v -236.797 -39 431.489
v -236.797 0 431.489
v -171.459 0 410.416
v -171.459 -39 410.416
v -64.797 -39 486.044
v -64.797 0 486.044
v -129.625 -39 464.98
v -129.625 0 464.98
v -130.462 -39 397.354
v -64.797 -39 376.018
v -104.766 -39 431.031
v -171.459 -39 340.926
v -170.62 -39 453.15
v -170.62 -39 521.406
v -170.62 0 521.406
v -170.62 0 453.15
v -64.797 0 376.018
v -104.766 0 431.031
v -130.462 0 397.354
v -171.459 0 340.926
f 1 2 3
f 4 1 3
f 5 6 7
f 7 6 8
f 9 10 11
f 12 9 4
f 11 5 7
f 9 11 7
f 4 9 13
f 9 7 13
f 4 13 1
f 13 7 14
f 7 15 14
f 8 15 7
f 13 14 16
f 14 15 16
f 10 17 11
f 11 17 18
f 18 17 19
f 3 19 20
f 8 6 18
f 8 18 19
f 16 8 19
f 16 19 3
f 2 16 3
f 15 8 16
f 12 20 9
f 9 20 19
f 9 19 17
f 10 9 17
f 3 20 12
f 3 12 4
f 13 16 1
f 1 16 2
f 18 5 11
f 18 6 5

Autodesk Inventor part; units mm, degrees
ref_plane "YZ Plane" through (0, 0, 0) normal (1, 0, 0) x (0, 1, 0)
ref_plane "XZ Plane" through (0, 0, 0) normal (0, 1, 0) x (-1, 0, 0)
ref_plane "XY Plane" through (0, 0, 0) normal (0, 0, 1) x (1, 0, 0)
sketch "Эскиз1" plane through (0, 0, 0) normal (0, 1, 0) x (-1, 0, 0)
  circle A0 centre (141.9995, 431.0309) radius 94.7983
  line L0 (141.9995, 613.3951) -> (141.9995, 248.6146)
  line L1 (141.9995, 431.0309) -> (232.158, 401.7366)
  line L2 (170.6201, 521.4056) -> (170.6201, 453.1496)
  line L3 (171.4591, 340.9262) -> (171.4591, 410.4158)
  line L4 (171.4591, 340.9262) -> (130.4621, 397.3537)
  line L5 (64.7967, 486.044) -> (129.6246, 464.9802)
  line L6 (64.7967, 486.044) -> (104.7661, 431.0309)
  line L7 (170.6201, 453.1496) -> (236.7967, 431.4888)
  line L8 (236.7967, 431.4888) -> (171.4591, 410.4158)
  line L9 (130.4621, 397.3537) -> (64.7967, 376.0177)
  line L10 (64.7967, 376.0177) -> (104.7661, 431.0309)
  line L11 (170.6201, 521.4056) -> (129.6246, 464.9802)
  point P0 (141.9995, 431.0049)
  dimension "d22" = 172
  dimension "d24" = 172
  dimension "d27" = 72
  dimension "d41" = 36
  dimension "d43" = 36
  dimension "d44" = 36
  dimension "d45" = 36
  dimension "d46" = 36
extrude "Выдавливание1" add sketch "Эскиз1" against normal blind 39 contours L8 L1 L0 L11 L2 L7 | L8 L3 L4 L0 L1 | L0 L4 L9 L10 L6 L5 L11
